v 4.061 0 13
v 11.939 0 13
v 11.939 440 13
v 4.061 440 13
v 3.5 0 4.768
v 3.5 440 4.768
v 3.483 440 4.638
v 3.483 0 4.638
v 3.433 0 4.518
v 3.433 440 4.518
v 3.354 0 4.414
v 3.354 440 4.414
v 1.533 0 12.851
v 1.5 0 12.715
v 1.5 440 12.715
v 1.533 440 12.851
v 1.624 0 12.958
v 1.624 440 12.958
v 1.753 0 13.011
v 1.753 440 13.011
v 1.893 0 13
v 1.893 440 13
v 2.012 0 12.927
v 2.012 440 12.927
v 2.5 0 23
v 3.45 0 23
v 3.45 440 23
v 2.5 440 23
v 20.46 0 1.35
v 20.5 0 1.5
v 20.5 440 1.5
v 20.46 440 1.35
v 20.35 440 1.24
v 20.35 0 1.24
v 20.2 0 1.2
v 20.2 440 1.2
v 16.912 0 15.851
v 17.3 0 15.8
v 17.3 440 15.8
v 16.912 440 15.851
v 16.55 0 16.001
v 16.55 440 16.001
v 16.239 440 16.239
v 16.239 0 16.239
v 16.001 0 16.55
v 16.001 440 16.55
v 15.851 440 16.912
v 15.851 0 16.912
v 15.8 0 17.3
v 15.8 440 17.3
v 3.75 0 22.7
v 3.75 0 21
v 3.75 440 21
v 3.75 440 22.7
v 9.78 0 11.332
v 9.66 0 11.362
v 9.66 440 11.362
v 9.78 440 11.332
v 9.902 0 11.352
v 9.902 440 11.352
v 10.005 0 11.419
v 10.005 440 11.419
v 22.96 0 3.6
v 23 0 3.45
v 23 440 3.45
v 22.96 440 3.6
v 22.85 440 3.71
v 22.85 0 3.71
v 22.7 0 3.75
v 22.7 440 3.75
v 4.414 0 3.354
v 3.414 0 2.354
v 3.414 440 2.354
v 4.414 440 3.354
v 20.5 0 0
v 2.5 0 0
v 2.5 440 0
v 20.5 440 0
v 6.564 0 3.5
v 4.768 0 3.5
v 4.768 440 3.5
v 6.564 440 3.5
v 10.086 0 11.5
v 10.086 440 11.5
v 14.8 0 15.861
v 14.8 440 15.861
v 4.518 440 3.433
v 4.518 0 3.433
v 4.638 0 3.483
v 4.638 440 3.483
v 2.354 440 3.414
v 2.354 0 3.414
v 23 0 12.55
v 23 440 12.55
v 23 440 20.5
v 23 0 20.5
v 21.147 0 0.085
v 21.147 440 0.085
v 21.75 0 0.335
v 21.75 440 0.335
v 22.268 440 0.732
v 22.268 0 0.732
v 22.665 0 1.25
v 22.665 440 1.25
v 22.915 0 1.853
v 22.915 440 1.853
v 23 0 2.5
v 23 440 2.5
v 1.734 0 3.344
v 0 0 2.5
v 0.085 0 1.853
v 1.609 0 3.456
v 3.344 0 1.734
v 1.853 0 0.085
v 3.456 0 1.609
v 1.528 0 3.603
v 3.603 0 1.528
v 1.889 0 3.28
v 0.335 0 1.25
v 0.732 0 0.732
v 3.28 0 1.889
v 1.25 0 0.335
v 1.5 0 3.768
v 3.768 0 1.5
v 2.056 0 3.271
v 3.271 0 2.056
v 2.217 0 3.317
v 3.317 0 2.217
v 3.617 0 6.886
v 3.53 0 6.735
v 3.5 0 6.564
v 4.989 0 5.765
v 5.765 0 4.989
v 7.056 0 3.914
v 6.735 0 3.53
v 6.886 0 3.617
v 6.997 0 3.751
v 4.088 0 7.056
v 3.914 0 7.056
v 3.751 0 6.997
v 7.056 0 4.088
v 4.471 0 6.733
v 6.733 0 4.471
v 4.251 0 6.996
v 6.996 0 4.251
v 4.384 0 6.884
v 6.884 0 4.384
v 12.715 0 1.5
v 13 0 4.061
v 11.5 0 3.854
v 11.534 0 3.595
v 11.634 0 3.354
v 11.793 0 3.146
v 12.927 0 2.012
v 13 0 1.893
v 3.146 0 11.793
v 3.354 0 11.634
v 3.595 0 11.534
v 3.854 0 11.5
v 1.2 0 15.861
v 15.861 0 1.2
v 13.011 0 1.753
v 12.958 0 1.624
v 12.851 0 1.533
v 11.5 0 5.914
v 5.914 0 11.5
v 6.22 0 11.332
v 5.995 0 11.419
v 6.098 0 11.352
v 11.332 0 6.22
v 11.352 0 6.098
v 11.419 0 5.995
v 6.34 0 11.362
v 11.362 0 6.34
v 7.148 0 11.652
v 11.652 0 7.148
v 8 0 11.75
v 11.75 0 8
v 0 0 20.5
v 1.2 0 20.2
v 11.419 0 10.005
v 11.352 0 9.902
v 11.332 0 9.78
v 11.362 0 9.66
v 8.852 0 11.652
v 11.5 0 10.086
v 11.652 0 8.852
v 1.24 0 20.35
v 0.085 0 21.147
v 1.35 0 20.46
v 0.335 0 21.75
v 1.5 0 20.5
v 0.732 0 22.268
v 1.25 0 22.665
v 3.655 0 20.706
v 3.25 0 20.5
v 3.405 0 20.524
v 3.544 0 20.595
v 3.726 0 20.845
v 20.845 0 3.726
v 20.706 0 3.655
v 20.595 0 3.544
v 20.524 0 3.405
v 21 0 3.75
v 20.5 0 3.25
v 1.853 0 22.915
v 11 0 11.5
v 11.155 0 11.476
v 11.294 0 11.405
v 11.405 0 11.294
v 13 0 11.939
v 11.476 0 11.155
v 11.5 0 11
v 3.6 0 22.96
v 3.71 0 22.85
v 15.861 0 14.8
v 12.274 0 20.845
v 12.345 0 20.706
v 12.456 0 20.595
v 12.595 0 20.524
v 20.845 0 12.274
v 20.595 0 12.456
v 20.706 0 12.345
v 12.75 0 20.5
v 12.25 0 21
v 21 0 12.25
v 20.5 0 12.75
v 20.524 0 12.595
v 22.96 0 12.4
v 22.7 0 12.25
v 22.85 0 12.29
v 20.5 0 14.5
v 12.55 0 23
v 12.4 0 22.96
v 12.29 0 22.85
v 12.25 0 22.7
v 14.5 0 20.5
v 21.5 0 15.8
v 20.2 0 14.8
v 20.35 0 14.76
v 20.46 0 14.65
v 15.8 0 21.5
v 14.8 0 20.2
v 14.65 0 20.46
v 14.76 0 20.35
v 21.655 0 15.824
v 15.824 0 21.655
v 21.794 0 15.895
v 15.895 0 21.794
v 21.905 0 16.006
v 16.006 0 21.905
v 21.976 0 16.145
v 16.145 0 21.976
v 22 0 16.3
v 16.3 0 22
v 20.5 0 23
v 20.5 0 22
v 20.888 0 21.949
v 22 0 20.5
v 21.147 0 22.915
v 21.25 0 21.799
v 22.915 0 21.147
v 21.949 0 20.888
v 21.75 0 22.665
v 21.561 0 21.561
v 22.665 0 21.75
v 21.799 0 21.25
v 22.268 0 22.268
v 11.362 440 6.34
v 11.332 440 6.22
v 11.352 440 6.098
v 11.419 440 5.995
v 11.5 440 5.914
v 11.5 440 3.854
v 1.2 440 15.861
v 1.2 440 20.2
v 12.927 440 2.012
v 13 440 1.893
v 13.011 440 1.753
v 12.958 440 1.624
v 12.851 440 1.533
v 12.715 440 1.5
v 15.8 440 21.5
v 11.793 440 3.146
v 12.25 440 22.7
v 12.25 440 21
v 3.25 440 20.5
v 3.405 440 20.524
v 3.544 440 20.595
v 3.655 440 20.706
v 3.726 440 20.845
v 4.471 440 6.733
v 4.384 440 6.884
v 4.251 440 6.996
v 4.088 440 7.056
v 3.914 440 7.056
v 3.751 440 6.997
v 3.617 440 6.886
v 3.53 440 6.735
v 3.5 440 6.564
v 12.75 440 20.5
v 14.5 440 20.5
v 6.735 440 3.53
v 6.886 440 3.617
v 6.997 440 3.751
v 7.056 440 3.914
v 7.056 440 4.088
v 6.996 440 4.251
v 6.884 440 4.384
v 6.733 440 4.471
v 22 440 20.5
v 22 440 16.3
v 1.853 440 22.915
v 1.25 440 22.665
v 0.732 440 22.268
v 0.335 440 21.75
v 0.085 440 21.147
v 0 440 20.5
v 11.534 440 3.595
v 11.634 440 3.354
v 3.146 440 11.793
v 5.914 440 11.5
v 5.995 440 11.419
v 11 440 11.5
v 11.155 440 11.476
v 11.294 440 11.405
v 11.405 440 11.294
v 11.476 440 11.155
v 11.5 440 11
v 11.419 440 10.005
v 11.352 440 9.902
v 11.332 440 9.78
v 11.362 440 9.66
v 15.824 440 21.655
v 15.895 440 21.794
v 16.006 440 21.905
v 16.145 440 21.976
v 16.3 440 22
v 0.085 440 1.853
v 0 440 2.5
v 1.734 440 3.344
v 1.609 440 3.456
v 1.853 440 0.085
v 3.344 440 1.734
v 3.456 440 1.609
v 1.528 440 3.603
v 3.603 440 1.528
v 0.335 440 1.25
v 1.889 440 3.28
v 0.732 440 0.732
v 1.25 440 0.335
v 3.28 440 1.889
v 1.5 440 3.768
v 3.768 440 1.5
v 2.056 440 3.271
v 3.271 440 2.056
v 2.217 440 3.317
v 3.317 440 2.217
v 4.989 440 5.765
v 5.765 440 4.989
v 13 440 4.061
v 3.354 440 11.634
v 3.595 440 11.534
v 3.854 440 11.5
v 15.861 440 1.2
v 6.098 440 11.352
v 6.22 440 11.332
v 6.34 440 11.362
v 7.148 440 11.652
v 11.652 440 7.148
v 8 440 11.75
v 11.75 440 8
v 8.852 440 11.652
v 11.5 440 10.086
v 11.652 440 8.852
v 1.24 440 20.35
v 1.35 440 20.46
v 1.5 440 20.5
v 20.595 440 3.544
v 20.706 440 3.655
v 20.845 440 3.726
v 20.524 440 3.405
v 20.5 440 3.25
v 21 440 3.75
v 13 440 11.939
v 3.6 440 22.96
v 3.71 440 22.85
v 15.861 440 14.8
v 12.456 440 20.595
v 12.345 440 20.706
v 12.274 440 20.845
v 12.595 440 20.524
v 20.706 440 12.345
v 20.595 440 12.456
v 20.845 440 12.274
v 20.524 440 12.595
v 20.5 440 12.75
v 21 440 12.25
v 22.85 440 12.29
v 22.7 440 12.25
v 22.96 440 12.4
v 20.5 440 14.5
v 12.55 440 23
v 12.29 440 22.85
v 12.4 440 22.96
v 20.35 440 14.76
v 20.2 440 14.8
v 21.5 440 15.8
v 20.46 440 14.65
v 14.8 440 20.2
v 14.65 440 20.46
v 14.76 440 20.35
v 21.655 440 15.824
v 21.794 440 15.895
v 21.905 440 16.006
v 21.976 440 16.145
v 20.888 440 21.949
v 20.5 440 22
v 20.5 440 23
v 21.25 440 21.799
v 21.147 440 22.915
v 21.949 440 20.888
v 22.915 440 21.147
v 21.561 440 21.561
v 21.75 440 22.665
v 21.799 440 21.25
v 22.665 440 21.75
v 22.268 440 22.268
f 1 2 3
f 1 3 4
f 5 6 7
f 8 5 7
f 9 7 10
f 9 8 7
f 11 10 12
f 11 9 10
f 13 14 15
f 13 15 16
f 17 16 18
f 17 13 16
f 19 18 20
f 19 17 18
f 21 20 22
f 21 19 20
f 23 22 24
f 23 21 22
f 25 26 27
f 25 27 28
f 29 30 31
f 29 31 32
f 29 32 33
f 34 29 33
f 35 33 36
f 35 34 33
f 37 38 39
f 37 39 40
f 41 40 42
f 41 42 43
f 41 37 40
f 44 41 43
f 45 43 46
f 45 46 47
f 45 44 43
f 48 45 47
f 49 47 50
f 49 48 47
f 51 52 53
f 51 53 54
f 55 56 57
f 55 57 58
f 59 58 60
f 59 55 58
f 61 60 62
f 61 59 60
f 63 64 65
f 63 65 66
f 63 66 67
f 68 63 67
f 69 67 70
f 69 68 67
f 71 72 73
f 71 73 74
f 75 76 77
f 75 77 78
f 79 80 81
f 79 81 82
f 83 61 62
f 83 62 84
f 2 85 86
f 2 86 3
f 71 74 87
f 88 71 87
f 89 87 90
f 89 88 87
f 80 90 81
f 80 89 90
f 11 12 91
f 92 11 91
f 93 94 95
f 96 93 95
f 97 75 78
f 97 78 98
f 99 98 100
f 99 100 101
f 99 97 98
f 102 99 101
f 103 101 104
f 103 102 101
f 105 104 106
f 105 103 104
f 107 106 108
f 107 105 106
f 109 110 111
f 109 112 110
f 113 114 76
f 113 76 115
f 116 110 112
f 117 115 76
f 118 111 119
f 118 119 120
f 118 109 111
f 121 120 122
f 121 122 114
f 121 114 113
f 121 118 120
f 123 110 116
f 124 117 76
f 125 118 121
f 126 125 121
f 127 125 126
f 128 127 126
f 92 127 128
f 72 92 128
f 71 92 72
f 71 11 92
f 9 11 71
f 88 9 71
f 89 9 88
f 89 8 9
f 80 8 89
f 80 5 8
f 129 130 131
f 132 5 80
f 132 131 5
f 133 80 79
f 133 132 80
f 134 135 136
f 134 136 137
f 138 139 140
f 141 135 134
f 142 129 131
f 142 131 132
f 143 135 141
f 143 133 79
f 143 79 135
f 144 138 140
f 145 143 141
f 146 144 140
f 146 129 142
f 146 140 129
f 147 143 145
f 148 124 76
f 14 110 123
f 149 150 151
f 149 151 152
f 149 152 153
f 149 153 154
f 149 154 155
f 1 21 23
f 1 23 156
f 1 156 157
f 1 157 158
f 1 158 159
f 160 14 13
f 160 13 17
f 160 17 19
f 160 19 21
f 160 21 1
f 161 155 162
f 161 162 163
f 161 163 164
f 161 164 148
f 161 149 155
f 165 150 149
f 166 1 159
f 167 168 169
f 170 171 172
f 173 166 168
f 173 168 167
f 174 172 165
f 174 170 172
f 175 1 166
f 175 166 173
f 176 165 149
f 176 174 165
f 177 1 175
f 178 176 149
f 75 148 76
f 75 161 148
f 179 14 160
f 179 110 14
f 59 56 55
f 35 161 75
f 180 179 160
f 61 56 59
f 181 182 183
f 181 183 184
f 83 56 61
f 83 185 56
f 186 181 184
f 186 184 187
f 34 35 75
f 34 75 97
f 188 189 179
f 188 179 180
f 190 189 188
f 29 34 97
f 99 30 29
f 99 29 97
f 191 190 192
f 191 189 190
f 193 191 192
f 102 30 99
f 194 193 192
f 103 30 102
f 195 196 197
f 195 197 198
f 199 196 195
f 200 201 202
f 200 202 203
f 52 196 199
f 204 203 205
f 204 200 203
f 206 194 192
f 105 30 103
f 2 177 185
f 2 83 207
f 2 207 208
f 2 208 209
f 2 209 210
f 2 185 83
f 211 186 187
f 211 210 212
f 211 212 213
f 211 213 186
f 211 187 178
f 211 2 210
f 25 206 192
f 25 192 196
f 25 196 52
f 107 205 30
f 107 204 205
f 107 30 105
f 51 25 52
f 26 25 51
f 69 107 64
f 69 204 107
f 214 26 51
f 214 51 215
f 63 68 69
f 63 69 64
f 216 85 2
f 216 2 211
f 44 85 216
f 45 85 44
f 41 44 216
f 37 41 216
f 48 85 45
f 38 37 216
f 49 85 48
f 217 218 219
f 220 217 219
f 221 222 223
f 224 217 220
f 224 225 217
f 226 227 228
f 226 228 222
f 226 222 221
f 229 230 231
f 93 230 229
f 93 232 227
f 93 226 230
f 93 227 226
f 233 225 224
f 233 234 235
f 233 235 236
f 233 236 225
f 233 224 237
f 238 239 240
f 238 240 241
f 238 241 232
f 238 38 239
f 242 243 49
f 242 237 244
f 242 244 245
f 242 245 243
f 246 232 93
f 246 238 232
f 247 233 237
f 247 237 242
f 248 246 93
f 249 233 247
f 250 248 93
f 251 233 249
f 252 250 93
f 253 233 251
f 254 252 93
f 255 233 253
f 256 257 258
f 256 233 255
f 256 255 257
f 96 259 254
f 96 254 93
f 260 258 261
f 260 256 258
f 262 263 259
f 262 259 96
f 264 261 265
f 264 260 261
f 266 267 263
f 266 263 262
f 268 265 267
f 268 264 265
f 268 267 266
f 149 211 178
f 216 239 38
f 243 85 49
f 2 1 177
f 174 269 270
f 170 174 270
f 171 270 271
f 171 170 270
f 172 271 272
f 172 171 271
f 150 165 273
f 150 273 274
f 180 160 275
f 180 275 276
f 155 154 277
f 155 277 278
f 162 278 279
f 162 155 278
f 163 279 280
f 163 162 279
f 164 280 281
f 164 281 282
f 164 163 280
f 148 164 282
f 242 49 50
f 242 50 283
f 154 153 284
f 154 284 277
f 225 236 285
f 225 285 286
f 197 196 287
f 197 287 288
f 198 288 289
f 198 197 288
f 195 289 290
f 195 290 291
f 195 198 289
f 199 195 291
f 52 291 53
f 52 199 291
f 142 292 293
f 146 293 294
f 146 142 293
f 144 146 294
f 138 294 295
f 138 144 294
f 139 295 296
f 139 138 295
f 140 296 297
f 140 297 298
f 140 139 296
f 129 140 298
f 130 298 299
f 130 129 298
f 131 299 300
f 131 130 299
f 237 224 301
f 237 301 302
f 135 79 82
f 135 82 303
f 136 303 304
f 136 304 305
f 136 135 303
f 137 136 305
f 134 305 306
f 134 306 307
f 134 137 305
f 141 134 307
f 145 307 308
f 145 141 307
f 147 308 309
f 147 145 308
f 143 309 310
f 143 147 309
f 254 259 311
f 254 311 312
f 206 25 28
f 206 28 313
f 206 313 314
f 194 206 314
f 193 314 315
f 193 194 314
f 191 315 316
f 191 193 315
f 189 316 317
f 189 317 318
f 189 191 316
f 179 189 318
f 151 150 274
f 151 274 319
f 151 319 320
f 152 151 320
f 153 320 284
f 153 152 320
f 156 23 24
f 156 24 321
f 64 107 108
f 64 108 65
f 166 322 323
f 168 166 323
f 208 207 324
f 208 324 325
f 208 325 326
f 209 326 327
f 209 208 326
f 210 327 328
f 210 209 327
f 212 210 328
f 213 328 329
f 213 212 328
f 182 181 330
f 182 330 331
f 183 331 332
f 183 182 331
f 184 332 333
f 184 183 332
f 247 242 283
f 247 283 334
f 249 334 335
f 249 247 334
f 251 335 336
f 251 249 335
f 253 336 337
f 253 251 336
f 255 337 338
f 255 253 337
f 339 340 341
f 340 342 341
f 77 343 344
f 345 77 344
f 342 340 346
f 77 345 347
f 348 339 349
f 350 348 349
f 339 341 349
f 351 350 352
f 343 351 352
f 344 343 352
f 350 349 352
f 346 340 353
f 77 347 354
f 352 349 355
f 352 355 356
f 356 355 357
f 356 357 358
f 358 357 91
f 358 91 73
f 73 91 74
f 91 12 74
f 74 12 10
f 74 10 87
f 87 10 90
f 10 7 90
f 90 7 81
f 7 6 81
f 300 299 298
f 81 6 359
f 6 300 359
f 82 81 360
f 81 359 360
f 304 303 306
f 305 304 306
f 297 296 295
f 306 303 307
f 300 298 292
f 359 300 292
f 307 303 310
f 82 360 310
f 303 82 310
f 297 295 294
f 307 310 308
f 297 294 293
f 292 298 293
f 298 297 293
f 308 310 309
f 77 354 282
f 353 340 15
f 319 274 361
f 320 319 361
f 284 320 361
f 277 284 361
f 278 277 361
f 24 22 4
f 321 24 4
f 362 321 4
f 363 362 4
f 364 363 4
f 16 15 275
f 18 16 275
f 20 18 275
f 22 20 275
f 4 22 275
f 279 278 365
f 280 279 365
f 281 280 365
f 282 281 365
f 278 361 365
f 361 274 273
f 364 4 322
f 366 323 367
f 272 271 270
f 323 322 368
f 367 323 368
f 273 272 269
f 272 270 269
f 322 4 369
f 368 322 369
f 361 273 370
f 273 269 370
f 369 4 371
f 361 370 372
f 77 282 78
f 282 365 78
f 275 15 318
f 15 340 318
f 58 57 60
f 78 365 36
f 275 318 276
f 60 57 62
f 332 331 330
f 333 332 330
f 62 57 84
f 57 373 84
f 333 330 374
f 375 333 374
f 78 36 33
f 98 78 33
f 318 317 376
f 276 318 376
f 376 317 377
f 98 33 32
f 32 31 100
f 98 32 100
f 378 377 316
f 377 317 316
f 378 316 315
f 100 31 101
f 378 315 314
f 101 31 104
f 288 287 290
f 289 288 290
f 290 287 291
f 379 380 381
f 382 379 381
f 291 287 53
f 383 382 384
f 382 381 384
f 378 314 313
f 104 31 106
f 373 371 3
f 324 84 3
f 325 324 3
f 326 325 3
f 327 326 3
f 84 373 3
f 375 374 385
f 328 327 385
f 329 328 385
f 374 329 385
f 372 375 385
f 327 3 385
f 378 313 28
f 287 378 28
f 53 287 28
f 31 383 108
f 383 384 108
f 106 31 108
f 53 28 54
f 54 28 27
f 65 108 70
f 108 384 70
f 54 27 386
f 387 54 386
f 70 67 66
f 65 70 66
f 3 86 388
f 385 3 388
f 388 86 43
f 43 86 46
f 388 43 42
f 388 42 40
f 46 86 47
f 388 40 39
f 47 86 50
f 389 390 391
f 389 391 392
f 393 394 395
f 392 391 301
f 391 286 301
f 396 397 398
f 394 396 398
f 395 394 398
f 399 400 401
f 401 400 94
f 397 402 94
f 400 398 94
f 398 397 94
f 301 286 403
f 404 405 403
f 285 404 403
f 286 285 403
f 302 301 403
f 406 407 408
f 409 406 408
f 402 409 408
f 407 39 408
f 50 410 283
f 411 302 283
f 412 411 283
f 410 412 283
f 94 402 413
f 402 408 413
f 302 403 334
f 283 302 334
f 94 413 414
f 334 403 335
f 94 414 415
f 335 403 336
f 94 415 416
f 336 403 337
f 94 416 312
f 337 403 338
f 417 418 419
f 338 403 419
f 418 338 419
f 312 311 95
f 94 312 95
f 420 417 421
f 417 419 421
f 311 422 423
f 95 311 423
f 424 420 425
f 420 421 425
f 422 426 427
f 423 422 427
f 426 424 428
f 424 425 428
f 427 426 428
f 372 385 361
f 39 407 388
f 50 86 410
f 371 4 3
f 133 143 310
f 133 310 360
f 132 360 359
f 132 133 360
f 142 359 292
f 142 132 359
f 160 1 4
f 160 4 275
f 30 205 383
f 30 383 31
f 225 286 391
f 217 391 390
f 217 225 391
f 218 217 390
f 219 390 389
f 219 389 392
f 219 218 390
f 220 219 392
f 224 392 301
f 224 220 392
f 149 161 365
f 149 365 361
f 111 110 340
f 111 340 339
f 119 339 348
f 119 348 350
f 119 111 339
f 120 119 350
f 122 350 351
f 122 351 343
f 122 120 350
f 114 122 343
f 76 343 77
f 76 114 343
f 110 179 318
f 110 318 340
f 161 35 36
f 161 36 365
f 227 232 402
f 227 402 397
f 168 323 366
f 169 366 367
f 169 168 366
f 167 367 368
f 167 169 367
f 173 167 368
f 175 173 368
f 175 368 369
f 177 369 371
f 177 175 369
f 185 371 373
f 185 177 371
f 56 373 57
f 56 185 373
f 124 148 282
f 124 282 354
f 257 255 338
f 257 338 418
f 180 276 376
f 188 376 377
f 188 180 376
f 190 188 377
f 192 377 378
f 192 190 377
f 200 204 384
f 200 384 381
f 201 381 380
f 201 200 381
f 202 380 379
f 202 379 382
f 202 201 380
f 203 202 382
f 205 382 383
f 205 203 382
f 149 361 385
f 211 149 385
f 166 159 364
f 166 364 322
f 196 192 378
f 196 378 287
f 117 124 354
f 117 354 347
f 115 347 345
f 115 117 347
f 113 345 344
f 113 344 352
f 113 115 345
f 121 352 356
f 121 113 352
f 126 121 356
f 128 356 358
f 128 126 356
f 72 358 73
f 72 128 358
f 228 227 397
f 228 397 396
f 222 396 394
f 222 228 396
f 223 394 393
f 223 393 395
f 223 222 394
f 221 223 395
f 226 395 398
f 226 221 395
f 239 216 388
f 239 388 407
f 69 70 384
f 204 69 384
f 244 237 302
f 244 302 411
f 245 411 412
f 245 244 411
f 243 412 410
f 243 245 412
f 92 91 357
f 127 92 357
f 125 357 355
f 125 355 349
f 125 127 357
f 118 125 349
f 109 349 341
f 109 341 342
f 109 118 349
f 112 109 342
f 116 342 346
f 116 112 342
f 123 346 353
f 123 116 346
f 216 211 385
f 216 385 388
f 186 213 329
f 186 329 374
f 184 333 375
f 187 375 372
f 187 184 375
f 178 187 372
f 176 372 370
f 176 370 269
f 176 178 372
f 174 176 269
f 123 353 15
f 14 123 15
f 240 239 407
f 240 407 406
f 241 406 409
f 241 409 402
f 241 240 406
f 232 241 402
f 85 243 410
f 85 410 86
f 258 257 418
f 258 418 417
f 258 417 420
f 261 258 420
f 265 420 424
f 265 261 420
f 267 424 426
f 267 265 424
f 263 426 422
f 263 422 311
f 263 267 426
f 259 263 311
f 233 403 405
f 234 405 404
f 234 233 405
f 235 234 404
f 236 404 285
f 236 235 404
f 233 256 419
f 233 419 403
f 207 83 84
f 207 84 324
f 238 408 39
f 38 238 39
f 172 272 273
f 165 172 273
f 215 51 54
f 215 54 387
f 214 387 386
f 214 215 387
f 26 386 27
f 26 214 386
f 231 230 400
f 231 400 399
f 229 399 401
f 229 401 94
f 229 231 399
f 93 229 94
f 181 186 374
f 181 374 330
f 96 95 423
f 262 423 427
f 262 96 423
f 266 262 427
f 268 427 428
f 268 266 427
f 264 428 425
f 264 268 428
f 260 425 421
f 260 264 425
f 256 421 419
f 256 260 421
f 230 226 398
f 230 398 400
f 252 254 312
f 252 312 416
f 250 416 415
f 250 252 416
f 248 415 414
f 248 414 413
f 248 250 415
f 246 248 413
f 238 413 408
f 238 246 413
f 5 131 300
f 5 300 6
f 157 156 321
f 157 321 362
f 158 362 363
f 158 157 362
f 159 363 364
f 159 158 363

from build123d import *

# Parameters (mm, degrees)
AUFSATZ_LINEAR_AUSTRAGEN1_DEPTH = 440


with BuildPart() as part:
    # Skizze1 → Aufsatz-Linear austragen1 (new body)
    with BuildSketch(Plane.XZ):
        with BuildLine():
            Line((3.450001515, 23.00000001), (2.5, 23.00000001))
            ThreePointArc((2.5, 23.00000001), (0.73223304, 22.26776696), (-1e-08, 20.5))
            Line((-1e-08, 20.5), (-1e-08, 2.50000002))
            ThreePointArc((-1e-08, 2.50000002), (0.732233039, 0.732233062), (2.499999998, 1.2e-08))
            Line((2.499999998, 1.2e-08), (20.499999977, 1.2e-08))
            ThreePointArc((20.499999977, 1.2e-08), (22.267766938, 0.732233062), (22.999999988, 2.500000023))
            Line((22.999999988, 2.500000023), (22.999999988, 3.450004181))
            ThreePointArc((22.999999988, 3.450004181), (22.912132793, 3.662134355), (22.700002619, 3.75000155))
            Line((22.700002619, 3.75000155), (20.999999992, 3.75000155))
            ThreePointArc((20.999999992, 3.75000155), (20.6464466, 3.60355494), (20.49999999, 3.250001548))
            Line((20.49999999, 3.250001548), (20.49999999, 1.500001969))
            ThreePointArc((20.49999999, 1.500001969), (20.412132795, 1.287871795), (20.200002621, 1.2000046))
            Line((20.200002621, 1.2000046), (15.86065559, 1.2000046))
            Line((15.86065559, 1.2000046), (12.99999999, 4.0606602))
            Line((12.99999999, 4.0606602), (12.99999999, 11.93933984))
            Line((12.99999999, 11.93933984), (15.86065559, 14.79999544))
            Line((15.86065559, 14.79999544), (20.200002638, 14.79999544))
            ThreePointArc((20.200002638, 14.79999544), (20.4121328, 14.71212825), (20.49999999, 14.499998088))
            Line((20.49999999, 14.499998088), (20.49999999, 12.749998492))
            ThreePointArc((20.49999999, 12.749998492), (20.6464466, 12.3964451), (20.999999992, 12.24999849))
            Line((20.999999992, 12.24999849), (22.700002636, 12.24999849))
            ThreePointArc((22.700002636, 12.24999849), (22.912132798, 12.33786568), (22.999999988, 12.549995842))
            Line((22.999999988, 12.549995842), (22.999999988, 20.5))
            ThreePointArc((22.999999988, 20.5), (22.267766938, 22.26776696), (20.499999977, 23.00000001))
            Line((20.499999977, 23.00000001), (12.549998485, 23.00000001))
            ThreePointArc((12.549998485, 23.00000001), (12.33786644, 22.91213204), (12.24999847, 22.699999995))
            Line((12.24999847, 22.699999995), (12.24999847, 21.000000012))
            ThreePointArc((12.24999847, 21.000000012), (12.39644508, 20.64644662), (12.749998472, 20.50000001))
            Line((12.749998472, 20.50000001), (14.499998051, 20.50000001))
            ThreePointArc((14.499998051, 20.50000001), (14.712128225, 20.412132815), (14.79999542, 20.200002641))
            Line((14.79999542, 20.200002641), (14.79999542, 15.86065561))
            Line((14.79999542, 15.86065561), (11.93933982, 13.00000001))
            Line((11.93933982, 13.00000001), (4.06066018, 13.00000001))
            Line((4.06066018, 13.00000001), (1.20000458, 15.86065561))
            Line((1.20000458, 15.86065561), (1.20000458, 20.200002658))
            ThreePointArc((1.20000458, 20.200002658), (1.28787177, 20.41213282), (1.500001932, 20.50000001))
            Line((1.500001932, 20.50000001), (3.250001528, 20.50000001))
            ThreePointArc((3.250001528, 20.50000001), (3.60355492, 20.64644662), (3.75000153, 21.000000012))
            Line((3.75000153, 21.000000012), (3.75000153, 22.699999995))
            ThreePointArc((3.75000153, 22.699999995), (3.66213356, 22.91213204), (3.450001515, 23.00000001))
        make_face()
        with BuildLine():
            Line((1.49999999, 3.767766952), (1.49999999, 12.715075784))
            ThreePointArc((1.49999999, 12.715075784), (1.685194957, 12.992239639), (2.012132015, 12.927207815))
            Line((2.012132015, 12.927207815), (3.146446603, 11.792893227))
            ThreePointArc((3.146446603, 11.792893227), (3.470869961, 11.57612047), (3.853553404, 11.5))
            Line((3.853553404, 11.5), (5.91421356, 11.5))
            Line((5.91421356, 11.5), (5.994865994, 11.419347566))
            ThreePointArc((5.994865994, 11.419347566), (6.158199998, 11.33547495), (6.339812993, 11.362481111))
            ThreePointArc((6.339812993, 11.362481111), (7.999999982, 11.750000011), (9.660186973, 11.362481114))
            ThreePointArc((9.660186973, 11.362481114), (9.841799967, 11.335474953), (10.00513397, 11.419347568))
            Line((10.00513397, 11.419347568), (10.085786402, 11.5))
            Line((10.085786402, 11.5), (10.999999968, 11.5))
            ThreePointArc((10.999999968, 11.5), (11.35355336, 11.35355339), (11.49999997, 10.999999998))
            Line((11.49999997, 10.999999998), (11.49999997, 10.085786456))
            Line((11.49999997, 10.085786456), (11.41934753, 10.005134016))
            ThreePointArc((11.41934753, 10.005134016), (11.335474915, 9.841800012), (11.362481077, 9.660187017))
            ThreePointArc((11.362481077, 9.660187017), (11.749999981, 8.00000002), (11.362481081, 6.339813023))
            ThreePointArc((11.362481081, 6.339813023), (11.33547492, 6.158200028), (11.419347536, 5.994866024))
            Line((11.419347536, 5.994866024), (11.49999997, 5.91421359))
            Line((11.49999997, 5.91421359), (11.49999997, 3.853553434))
            ThreePointArc((11.49999997, 3.853553434), (11.57612044, 3.470869991), (11.792893197, 3.146446633))
            Line((11.792893197, 3.146446633), (12.927207774, 2.012132056))
            ThreePointArc((12.927207774, 2.012132056), (12.992239599, 1.685194995), (12.715075743, 1.500000027))
            Line((12.715075743, 1.500000027), (3.767766925, 1.500000027))
            ThreePointArc((3.767766925, 1.500000027), (3.305827172, 1.808658302), (3.414213544, 2.353553394))
            Line((3.414213544, 2.353553394), (4.41421357, 3.35355342))
            ThreePointArc((4.41421357, 3.35355342), (4.576425223, 3.461939781), (4.767766914, 3.50000001))
            Line((4.767766914, 3.50000001), (6.563859334, 3.50000001))
            ThreePointArc((6.563859334, 3.50000001), (7.05645152, 3.91425072), (6.732817059, 4.47058825))
            ThreePointArc((6.732817059, 4.47058825), (5.348349567, 5.348349579), (4.470588229, 6.732817064))
            ThreePointArc((4.470588229, 6.732817064), (3.914250698, 7.056451522), (3.49999999, 6.563859337))
            Line((3.49999999, 6.563859337), (3.49999999, 4.767766934))
            ThreePointArc((3.49999999, 4.767766934), (3.461939761, 4.576425243), (3.3535534, 4.41421359))
            Line((3.3535534, 4.41421359), (2.353553374, 3.414213564))
            ThreePointArc((2.353553374, 3.414213564), (1.808658272, 3.305827189), (1.49999999, 3.767766952))
        make_face(mode=Mode.SUBTRACT)
        with BuildLine():
            Line((15.79999543, 17.299995436), (15.79999543, 21.499999998))
            ThreePointArc((15.79999543, 21.499999998), (15.94644204, 21.85355339), (16.299995432, 22))
            Line((16.299995432, 22), (20.499999977, 22))
            ThreePointArc((20.499999977, 22), (21.560660149, 21.560660172), (21.999999978, 20.5))
            Line((21.999999978, 20.5), (21.999999978, 16.299995432))
            ThreePointArc((21.999999978, 16.299995432), (21.853553368, 15.94644204), (21.499999976, 15.79999543))
            Line((21.499999976, 15.79999543), (17.299995436, 15.79999543))
            ThreePointArc((17.299995436, 15.79999543), (16.23933526, 16.23933526), (15.79999543, 17.299995436))
        make_face(mode=Mode.SUBTRACT)
    extrude(amount=-AUFSATZ_LINEAR_AUSTRAGEN1_DEPTH)


solid = part.part
